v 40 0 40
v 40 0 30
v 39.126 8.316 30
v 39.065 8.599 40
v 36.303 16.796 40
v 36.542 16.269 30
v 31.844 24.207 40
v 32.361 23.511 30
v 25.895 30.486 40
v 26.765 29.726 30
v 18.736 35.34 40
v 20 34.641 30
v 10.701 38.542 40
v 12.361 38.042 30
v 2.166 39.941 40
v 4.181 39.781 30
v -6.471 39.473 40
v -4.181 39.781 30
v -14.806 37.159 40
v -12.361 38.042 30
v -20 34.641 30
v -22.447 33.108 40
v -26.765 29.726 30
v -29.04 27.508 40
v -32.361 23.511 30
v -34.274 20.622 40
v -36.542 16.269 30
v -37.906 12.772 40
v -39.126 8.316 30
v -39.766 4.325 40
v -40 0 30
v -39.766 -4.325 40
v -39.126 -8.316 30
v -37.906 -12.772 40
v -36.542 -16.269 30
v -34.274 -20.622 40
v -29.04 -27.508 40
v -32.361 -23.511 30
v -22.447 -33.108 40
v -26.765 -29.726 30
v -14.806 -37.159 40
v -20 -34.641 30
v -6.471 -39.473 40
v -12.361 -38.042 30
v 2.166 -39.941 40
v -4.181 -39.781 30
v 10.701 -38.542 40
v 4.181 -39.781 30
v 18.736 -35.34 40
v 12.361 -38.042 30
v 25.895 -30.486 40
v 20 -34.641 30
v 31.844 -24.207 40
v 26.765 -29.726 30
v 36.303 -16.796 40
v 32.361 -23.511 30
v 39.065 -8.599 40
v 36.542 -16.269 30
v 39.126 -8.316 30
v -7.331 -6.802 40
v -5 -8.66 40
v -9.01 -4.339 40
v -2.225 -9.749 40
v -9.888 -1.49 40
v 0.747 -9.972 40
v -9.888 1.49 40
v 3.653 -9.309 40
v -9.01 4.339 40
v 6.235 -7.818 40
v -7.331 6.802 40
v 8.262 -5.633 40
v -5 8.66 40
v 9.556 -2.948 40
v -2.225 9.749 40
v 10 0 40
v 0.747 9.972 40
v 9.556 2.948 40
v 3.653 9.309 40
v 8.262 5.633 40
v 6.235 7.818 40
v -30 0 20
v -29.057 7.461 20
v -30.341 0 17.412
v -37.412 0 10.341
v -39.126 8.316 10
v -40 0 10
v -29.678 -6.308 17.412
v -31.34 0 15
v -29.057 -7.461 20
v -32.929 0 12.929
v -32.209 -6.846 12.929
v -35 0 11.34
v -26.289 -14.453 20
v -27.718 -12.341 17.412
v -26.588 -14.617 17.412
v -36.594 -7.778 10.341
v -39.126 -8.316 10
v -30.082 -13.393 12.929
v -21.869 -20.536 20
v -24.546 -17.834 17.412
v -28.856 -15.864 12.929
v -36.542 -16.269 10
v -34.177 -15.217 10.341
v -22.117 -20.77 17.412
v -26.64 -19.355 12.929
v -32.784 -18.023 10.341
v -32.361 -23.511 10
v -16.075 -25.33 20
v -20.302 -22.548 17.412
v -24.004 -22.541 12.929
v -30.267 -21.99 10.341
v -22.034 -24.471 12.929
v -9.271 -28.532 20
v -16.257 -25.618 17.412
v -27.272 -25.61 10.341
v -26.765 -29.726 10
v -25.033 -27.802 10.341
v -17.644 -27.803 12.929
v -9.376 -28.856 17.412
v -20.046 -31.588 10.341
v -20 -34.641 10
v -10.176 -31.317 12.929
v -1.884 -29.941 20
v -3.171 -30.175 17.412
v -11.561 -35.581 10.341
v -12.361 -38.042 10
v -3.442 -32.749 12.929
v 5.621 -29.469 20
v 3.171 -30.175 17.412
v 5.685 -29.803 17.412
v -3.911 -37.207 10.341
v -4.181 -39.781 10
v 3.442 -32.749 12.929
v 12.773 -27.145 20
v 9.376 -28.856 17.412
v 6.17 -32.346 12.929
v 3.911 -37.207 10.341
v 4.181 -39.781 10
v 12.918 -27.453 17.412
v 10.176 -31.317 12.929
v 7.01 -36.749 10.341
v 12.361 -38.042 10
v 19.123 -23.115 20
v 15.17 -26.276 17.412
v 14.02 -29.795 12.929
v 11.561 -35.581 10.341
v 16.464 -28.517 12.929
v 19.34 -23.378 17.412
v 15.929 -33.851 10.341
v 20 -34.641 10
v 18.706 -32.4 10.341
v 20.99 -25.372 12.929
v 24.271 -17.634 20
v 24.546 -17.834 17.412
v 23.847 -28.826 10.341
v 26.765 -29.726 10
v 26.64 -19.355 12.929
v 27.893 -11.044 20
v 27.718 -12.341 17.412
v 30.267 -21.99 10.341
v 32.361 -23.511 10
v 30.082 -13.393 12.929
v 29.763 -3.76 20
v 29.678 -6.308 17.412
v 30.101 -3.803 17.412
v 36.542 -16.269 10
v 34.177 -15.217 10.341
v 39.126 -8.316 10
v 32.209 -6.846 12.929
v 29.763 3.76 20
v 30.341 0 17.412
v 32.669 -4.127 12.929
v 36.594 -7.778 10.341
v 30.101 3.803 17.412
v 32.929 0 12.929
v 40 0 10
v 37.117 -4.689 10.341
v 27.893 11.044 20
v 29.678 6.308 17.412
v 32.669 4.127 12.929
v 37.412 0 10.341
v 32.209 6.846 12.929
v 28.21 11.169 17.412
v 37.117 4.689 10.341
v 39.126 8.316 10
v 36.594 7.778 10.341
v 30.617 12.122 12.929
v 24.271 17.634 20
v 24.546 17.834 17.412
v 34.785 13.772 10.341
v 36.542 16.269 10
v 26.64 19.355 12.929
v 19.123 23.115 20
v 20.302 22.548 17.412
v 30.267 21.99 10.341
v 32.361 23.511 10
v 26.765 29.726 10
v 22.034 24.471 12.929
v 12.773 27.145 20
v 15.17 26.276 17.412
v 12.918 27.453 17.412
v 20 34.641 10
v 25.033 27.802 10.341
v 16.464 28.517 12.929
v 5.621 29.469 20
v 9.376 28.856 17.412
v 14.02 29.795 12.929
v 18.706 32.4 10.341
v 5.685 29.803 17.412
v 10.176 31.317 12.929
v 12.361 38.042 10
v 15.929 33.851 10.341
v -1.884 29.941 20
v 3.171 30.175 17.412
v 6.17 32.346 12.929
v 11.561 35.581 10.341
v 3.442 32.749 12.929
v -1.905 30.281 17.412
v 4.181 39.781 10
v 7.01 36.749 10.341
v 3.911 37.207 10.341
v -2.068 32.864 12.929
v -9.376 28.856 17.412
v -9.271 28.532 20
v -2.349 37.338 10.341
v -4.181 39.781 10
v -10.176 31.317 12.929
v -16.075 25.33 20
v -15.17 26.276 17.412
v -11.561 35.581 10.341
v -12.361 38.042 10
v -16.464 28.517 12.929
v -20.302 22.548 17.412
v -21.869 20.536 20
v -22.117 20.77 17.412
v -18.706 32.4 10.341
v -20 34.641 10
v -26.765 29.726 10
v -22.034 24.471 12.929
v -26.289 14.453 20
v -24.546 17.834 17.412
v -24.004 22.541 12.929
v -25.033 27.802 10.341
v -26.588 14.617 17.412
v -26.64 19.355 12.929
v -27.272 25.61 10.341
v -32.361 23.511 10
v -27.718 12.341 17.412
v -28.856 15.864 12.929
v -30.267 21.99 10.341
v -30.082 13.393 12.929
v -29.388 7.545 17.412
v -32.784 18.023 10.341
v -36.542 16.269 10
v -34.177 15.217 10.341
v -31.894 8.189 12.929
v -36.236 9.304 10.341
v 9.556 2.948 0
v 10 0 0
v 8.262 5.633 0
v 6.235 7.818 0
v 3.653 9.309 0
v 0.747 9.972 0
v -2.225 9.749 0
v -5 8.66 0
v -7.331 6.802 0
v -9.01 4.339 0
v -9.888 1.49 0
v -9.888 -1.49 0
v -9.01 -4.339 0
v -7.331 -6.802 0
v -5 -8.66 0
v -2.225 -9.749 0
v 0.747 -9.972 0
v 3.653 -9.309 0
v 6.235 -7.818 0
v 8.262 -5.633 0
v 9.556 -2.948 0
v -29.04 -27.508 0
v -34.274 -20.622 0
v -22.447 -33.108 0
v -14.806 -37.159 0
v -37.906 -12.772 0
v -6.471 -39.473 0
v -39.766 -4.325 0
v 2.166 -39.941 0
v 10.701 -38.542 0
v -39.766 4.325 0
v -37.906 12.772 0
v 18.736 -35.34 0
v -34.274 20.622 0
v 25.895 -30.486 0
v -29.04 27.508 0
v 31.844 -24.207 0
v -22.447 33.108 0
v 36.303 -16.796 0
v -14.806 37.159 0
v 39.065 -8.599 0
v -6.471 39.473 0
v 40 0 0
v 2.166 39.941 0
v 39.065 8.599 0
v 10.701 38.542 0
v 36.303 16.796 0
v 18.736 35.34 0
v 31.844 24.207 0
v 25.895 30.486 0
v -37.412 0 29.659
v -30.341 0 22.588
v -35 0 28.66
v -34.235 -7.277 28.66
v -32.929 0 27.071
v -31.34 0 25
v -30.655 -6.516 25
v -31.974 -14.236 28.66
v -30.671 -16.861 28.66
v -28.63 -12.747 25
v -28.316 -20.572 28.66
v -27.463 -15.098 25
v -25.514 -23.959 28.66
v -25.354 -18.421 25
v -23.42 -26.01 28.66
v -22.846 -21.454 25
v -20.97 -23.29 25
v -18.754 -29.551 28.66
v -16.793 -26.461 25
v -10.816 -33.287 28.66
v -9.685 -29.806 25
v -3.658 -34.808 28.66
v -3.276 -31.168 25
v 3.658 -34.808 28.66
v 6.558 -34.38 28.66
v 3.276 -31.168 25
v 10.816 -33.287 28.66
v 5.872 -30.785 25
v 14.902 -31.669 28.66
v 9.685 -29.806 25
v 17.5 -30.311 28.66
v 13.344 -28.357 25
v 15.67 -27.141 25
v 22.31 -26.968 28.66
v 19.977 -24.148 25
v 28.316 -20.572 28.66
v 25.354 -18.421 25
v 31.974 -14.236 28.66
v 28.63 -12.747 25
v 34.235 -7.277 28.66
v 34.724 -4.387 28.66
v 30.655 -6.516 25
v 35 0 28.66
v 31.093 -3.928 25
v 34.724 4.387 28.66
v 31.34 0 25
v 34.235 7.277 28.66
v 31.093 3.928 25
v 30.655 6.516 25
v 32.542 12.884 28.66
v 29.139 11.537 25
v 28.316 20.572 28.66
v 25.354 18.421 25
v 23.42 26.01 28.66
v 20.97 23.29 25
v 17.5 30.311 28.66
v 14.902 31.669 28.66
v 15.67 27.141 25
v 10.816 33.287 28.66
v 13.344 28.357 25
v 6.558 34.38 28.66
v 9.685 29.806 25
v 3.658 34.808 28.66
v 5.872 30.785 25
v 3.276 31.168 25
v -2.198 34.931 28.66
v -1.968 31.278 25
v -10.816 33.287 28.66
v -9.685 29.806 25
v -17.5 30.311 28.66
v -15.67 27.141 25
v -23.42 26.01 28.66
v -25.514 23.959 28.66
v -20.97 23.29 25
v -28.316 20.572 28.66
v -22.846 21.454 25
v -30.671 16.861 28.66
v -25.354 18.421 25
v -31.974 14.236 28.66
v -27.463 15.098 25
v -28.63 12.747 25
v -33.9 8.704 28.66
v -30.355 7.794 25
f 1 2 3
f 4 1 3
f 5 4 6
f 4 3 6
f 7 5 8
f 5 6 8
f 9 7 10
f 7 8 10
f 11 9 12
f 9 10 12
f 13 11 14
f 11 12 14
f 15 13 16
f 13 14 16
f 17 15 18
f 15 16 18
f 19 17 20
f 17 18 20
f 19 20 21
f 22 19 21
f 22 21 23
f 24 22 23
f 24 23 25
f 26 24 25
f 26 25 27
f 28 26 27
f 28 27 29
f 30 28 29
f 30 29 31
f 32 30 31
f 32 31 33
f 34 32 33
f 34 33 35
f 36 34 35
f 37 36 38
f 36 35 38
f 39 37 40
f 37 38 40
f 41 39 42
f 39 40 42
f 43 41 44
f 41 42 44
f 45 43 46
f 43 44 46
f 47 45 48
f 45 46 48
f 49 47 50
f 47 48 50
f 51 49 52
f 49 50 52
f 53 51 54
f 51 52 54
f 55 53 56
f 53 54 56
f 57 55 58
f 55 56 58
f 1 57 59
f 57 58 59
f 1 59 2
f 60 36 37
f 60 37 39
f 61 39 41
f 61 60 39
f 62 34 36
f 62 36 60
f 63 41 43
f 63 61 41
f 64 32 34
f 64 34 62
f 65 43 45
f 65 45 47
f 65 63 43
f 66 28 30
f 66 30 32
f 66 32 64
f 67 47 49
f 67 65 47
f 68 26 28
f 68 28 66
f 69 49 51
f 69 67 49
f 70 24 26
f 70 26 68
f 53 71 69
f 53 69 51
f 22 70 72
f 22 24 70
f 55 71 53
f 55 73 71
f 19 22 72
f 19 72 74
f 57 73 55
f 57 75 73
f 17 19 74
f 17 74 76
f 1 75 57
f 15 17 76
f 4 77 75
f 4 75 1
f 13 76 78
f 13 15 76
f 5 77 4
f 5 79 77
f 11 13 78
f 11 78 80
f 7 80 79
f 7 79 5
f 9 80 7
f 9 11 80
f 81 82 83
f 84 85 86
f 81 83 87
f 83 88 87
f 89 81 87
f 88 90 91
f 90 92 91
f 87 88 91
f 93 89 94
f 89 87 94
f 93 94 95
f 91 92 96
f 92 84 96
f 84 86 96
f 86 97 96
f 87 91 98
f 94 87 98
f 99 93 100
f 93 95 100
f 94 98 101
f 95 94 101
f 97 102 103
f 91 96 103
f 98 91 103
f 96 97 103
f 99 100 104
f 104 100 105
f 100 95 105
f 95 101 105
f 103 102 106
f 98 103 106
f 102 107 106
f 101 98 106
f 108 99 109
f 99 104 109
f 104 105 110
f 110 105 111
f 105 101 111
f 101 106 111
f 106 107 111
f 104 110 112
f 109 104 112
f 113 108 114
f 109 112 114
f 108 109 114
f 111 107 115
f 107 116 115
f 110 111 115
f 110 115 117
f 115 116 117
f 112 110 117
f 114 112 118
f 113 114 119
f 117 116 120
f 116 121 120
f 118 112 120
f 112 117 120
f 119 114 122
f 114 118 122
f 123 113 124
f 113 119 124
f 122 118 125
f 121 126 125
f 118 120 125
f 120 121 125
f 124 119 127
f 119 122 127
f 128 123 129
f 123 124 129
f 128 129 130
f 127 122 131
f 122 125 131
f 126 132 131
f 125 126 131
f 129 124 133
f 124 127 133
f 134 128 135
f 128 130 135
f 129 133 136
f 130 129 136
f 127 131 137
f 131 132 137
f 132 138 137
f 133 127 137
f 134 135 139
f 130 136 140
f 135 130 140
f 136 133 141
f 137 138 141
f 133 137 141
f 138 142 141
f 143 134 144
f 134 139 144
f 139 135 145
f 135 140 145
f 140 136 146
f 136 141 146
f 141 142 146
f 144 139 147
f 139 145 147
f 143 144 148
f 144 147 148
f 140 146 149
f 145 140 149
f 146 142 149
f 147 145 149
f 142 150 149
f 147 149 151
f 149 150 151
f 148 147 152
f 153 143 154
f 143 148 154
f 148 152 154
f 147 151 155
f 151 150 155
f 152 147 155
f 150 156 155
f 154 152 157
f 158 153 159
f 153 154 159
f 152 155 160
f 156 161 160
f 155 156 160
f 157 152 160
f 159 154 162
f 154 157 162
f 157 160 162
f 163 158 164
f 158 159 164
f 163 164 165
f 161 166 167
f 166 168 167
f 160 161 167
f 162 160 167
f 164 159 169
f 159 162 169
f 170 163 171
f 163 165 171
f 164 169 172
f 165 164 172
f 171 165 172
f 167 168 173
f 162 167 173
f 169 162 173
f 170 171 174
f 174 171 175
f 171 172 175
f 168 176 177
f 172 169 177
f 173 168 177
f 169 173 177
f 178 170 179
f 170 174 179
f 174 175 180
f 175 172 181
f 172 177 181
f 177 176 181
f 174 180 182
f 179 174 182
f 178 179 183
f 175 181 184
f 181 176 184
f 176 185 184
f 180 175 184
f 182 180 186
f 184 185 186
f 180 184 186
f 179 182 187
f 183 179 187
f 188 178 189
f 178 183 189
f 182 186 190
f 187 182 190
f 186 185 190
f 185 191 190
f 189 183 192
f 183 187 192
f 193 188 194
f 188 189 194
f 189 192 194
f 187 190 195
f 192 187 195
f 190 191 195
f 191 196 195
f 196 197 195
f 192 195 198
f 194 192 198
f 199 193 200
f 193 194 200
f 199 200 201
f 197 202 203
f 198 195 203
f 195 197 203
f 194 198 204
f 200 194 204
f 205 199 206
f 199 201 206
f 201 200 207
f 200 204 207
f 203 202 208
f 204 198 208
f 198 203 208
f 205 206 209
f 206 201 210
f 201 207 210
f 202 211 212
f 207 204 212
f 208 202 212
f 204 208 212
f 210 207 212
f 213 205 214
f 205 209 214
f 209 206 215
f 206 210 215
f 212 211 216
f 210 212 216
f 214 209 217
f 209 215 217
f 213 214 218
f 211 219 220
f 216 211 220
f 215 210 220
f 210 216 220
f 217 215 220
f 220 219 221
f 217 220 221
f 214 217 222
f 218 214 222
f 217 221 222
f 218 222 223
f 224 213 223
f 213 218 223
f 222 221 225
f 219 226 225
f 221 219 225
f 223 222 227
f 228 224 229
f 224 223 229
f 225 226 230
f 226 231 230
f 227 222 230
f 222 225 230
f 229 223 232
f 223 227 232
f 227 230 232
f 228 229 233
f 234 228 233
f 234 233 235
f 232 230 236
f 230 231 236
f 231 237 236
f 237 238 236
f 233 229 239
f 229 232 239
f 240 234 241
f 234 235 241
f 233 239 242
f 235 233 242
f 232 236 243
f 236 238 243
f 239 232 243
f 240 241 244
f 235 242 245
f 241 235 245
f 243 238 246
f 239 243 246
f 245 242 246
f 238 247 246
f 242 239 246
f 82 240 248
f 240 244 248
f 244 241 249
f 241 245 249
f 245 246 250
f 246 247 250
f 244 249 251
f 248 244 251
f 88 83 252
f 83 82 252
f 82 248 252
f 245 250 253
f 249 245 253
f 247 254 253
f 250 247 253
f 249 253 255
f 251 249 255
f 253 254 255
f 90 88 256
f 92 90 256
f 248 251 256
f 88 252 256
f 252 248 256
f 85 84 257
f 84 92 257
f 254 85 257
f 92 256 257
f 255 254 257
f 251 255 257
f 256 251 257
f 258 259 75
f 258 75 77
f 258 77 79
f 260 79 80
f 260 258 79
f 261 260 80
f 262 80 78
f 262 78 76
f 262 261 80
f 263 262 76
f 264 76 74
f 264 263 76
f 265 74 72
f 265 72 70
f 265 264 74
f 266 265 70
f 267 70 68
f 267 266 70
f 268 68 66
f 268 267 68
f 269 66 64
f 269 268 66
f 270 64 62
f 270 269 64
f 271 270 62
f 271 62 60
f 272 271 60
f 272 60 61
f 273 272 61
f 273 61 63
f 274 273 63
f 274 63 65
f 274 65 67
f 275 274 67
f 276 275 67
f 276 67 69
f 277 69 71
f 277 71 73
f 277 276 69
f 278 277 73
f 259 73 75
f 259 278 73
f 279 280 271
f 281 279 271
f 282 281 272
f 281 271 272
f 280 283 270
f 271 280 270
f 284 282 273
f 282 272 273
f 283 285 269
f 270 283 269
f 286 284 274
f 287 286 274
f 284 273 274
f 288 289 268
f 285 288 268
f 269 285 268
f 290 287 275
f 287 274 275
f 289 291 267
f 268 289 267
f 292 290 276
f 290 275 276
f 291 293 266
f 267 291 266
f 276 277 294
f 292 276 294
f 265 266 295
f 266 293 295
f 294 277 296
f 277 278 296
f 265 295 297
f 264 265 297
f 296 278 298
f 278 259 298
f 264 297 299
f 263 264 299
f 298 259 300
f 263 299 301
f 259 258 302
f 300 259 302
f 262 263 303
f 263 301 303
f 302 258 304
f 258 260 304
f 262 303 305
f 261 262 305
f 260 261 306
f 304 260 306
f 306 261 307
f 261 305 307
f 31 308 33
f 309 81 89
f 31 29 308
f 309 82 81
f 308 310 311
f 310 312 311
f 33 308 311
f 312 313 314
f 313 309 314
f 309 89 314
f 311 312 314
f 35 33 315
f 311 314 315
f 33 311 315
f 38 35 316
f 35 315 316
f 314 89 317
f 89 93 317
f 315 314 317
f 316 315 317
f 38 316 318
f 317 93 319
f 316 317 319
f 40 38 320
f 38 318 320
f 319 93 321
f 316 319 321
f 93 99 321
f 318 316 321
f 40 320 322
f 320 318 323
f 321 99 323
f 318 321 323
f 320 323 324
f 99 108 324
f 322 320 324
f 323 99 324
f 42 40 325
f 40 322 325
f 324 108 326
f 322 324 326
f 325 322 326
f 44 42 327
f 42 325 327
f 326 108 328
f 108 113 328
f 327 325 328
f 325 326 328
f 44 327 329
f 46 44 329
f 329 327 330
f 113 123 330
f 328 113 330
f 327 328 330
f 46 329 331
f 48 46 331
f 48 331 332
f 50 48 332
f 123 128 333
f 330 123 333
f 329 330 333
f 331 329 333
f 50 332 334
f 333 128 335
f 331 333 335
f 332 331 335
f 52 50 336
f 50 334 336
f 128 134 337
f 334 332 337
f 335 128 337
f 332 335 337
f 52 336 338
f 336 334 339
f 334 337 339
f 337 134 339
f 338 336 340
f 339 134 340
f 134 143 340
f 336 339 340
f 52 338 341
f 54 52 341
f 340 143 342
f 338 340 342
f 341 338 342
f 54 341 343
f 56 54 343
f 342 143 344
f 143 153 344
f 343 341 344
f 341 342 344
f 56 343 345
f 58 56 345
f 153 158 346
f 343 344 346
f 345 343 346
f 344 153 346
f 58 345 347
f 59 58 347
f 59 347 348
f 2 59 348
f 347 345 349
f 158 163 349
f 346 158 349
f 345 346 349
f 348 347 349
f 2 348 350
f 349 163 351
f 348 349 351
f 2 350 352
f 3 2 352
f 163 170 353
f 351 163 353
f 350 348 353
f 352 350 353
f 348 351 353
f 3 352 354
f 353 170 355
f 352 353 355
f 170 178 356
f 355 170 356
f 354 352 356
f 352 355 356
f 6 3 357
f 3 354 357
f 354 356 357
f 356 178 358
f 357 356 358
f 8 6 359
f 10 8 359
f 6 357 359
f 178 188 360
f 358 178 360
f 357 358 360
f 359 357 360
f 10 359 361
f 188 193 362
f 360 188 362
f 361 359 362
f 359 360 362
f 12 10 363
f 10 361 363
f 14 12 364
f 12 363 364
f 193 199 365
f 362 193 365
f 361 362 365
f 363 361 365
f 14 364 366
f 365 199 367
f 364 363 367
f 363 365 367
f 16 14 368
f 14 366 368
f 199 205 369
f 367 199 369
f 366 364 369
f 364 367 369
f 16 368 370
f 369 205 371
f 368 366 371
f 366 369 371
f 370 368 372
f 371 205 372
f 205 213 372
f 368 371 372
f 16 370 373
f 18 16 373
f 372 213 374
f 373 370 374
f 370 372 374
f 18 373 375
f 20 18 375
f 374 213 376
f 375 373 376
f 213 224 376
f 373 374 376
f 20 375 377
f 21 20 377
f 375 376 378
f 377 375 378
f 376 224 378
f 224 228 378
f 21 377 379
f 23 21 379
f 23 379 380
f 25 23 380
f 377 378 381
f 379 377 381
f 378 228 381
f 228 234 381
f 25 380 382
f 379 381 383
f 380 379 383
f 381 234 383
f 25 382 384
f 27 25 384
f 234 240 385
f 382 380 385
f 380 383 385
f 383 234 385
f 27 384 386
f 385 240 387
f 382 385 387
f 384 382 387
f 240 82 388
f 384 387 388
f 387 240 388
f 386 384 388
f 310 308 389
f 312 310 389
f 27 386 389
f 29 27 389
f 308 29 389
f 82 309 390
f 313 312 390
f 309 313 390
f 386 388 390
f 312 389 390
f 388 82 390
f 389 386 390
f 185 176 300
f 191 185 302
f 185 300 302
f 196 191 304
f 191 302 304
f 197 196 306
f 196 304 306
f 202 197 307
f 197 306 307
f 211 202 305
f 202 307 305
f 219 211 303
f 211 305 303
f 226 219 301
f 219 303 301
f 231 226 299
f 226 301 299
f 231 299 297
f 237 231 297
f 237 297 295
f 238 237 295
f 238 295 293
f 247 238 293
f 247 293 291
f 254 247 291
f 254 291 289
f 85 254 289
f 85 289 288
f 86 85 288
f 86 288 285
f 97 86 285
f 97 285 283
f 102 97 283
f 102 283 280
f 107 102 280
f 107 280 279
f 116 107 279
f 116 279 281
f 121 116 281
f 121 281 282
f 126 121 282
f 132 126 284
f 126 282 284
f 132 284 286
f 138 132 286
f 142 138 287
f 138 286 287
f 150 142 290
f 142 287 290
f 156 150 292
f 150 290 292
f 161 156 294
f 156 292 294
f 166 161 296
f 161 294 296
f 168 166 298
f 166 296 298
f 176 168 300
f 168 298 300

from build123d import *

# Parameters (mm, degrees)
SKETCH1_R           = 40
SKETCH1_R_2         = 10
BOSS_EXTRUDE1_DEPTH = 40
SKETCH2_R           = 10


with BuildPart() as part:
    # Sketch1 → Boss-Extrude1 (new body)
    with BuildSketch(Plane.XY):
        Circle(SKETCH1_R)
        Circle(SKETCH1_R_2, mode=Mode.SUBTRACT)
    extrude(amount=BOSS_EXTRUDE1_DEPTH)

    # Sketch2 → Cut-Revolve1 (revolve, cut)
    with BuildSketch(Plane(origin=(0, 0, 0), x_dir=(1, 0, 0), z_dir=(0, 1, 0))):
        with Locations((-40, -20)):
            Circle(SKETCH2_R)
    revolve(axis=Axis((0, 0, 0), (0, 0, 1)), mode=Mode.SUBTRACT)


solid = part.part
